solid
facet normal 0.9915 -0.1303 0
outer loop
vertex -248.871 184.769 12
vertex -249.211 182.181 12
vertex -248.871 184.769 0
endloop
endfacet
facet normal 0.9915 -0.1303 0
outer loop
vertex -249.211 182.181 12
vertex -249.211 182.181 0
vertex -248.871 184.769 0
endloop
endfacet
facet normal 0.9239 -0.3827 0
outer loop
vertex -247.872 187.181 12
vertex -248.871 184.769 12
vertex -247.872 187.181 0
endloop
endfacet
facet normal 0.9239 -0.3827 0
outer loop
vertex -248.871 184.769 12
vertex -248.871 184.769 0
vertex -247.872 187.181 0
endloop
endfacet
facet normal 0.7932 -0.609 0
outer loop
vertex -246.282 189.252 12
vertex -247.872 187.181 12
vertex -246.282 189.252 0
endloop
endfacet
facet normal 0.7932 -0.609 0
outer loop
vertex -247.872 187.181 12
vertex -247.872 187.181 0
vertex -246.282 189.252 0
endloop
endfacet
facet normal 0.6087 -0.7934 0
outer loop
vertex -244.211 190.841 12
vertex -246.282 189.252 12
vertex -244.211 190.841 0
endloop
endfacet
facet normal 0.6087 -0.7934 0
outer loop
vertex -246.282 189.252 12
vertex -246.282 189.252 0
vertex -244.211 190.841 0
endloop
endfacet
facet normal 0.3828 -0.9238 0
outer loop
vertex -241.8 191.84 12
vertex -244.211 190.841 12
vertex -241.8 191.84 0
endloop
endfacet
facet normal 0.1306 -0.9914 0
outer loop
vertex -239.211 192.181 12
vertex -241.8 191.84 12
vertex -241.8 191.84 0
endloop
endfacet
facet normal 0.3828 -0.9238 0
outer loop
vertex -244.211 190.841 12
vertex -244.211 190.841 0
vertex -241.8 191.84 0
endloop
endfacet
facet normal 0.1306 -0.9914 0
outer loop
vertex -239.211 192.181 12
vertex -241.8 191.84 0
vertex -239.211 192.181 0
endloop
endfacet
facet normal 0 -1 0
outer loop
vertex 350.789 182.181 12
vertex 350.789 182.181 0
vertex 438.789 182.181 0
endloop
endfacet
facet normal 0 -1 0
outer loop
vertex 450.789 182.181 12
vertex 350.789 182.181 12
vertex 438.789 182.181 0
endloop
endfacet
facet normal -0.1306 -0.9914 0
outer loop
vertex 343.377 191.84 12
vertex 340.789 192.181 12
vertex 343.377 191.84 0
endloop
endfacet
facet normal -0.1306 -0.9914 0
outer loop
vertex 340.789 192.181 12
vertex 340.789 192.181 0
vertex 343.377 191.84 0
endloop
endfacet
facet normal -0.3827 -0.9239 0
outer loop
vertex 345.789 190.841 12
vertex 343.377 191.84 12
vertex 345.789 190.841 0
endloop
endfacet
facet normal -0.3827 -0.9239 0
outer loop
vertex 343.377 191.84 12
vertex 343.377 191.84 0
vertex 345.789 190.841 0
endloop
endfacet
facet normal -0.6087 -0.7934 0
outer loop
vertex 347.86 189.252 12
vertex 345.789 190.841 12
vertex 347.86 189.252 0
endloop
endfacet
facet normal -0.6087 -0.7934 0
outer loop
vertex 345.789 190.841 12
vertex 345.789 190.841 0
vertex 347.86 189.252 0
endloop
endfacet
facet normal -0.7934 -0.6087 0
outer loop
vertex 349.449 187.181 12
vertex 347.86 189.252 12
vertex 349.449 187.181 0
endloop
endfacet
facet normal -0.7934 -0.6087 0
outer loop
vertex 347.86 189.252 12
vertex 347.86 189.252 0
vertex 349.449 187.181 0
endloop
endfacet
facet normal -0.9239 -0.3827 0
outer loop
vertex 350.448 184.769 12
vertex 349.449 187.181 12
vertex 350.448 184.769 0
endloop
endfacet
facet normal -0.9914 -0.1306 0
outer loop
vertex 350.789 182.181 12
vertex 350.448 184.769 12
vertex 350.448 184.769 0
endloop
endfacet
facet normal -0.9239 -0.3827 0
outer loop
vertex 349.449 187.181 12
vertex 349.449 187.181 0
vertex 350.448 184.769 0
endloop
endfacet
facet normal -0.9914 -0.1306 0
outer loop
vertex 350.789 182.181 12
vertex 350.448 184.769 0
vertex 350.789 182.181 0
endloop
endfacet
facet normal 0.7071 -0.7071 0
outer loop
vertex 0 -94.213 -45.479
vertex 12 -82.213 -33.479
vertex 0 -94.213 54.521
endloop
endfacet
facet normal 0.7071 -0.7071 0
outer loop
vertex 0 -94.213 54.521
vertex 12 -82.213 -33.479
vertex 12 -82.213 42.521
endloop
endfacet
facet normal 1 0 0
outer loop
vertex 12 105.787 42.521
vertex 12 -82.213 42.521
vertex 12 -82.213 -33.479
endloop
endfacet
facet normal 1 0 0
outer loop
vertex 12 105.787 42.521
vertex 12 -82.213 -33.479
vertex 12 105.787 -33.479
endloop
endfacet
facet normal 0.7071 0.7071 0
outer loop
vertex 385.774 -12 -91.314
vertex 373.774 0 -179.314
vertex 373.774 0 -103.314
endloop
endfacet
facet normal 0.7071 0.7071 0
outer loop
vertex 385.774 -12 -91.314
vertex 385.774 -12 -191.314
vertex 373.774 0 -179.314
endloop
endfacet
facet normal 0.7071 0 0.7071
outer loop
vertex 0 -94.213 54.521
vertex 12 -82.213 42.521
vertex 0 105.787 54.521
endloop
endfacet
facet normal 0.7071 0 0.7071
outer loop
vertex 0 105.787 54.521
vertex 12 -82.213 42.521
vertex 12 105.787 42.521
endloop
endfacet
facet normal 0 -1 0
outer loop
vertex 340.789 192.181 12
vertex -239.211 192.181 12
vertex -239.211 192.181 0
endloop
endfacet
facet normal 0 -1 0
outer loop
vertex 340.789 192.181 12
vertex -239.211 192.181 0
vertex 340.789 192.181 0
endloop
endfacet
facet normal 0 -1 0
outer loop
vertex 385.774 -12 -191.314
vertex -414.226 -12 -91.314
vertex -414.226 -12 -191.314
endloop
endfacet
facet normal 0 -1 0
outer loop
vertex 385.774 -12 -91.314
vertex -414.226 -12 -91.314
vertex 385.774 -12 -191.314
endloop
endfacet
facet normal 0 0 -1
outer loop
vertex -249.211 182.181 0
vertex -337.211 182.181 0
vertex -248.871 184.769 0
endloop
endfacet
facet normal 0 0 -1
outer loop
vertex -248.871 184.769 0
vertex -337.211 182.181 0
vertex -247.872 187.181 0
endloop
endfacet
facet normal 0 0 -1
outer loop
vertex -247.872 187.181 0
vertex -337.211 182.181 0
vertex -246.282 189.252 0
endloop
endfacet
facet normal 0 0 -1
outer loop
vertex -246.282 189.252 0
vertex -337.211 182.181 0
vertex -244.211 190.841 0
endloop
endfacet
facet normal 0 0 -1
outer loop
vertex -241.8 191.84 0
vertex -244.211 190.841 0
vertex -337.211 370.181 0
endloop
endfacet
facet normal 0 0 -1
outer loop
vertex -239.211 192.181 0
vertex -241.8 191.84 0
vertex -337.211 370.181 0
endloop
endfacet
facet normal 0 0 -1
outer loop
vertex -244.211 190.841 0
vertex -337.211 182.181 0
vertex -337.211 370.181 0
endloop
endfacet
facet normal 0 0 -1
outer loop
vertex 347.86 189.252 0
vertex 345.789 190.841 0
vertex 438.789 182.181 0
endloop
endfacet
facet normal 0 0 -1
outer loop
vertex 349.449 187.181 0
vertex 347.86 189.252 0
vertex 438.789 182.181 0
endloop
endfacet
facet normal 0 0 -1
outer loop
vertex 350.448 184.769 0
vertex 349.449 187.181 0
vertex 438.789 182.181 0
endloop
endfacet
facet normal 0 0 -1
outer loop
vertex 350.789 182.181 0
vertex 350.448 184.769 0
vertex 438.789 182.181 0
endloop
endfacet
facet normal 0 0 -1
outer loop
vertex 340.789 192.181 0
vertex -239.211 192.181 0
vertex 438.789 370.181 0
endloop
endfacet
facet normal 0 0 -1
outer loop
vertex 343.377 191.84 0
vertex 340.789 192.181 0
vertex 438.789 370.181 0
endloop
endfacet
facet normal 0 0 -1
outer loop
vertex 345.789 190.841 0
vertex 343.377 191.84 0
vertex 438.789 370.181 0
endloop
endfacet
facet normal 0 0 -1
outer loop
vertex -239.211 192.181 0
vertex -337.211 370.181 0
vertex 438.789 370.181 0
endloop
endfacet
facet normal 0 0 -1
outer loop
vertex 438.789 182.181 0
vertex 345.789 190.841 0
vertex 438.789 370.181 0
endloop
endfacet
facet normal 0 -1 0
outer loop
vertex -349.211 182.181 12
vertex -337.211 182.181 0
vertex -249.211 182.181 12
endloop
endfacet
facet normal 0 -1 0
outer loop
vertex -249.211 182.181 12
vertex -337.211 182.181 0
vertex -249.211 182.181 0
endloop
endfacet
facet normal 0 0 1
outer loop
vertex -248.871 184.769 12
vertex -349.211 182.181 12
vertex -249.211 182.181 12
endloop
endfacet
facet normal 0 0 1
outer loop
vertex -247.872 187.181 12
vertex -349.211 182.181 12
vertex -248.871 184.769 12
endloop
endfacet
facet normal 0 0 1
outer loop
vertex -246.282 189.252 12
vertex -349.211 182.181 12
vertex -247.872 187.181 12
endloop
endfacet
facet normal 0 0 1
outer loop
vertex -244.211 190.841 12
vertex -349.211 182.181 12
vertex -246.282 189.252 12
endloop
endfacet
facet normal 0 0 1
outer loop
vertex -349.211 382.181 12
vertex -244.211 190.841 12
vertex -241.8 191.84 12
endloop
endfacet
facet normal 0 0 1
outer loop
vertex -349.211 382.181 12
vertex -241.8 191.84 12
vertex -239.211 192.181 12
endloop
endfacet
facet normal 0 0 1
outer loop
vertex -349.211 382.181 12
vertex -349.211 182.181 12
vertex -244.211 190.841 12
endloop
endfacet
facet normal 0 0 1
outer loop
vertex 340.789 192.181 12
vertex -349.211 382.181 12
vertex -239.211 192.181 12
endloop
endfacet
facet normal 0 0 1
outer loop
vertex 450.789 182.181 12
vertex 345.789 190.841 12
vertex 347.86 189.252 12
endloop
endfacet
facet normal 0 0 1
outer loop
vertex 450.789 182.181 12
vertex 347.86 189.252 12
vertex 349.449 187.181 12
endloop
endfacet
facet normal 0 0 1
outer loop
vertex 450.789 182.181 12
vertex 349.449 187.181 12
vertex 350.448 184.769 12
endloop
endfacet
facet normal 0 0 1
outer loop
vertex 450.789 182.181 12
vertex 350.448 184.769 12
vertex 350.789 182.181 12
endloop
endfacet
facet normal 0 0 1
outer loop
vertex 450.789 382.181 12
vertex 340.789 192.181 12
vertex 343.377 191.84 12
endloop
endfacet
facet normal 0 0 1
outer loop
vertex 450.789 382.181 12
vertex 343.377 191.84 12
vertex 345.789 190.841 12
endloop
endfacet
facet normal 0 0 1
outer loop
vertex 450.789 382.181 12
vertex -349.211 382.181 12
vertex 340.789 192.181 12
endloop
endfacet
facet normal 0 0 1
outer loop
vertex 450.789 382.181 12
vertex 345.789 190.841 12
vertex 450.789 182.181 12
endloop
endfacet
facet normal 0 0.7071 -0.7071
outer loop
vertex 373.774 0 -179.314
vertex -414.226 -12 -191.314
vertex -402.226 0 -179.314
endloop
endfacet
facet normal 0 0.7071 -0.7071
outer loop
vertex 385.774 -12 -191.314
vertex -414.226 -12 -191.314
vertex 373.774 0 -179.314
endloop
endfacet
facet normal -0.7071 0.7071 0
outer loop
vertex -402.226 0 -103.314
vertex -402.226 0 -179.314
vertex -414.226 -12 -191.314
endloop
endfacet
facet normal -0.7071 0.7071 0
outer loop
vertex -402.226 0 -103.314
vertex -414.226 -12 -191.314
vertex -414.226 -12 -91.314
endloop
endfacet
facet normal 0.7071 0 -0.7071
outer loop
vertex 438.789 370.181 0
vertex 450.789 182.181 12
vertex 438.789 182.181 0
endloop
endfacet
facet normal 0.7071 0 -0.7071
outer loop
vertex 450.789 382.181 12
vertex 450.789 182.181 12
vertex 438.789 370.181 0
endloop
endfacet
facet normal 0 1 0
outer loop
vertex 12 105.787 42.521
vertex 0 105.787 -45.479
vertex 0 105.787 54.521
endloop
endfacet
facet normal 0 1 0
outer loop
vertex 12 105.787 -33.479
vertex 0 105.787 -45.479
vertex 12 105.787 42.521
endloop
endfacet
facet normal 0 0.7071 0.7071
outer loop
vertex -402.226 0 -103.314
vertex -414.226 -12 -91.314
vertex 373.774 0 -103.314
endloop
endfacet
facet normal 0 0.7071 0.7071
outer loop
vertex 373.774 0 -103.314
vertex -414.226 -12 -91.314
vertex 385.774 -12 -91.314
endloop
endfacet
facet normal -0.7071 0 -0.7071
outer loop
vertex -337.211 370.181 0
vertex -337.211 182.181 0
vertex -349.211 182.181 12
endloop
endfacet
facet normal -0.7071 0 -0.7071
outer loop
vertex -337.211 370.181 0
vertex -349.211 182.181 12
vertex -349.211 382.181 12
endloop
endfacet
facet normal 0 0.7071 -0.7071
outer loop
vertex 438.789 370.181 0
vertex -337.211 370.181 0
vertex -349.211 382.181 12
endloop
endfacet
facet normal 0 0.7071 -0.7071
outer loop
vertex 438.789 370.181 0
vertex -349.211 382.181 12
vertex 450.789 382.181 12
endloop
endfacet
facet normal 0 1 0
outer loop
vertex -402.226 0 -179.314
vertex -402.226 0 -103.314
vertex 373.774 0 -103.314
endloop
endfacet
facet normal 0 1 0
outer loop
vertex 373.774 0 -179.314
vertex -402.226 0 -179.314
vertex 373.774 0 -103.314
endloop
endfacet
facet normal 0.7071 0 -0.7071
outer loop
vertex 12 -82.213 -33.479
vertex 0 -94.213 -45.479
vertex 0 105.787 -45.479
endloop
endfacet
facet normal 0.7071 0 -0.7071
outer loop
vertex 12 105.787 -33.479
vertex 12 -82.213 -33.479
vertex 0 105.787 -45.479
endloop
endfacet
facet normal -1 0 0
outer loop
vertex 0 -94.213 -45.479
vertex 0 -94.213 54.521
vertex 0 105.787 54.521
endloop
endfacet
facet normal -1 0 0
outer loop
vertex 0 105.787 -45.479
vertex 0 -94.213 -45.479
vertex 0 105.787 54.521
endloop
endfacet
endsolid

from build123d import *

# Parameters (mm, degrees)
F0_W      = 800
F0_H      = 100
F1_DEPTH  = 12
F2_W      = 200
F2_H      = 100
F3_DEPTH  = 12
F4_SIZE   = 11.99999
F5_SIZE   = 11.99999
F6_SIZE   = 11.99999
F7_W      = 800
F7_H      = 200
F8_DEPTH  = 12
F9_SIZE   = 11.99999
F10_SIZE  = 11.99999
F11_SIZE  = 11.99999
F12_SIZE  = 11.99999
F13_SIZE  = 11.99999
F14_SIZE  = 11.99999
F15_SIZE  = 11.99999
F16_W     = 600
F16_H     = 20
F17_DEPTH = 25
F18_R     = 9.99999
F19_R     = 9.99999


# Not quite as in the source:
# - a fillet or chamfer is up to 0.001 mm smaller than in the source, because OpenCascade refuses the exact size


with BuildPart() as f1:
    # F0 (on Front) → F1 (new body)
    with BuildSketch(Plane.XZ):
        with Locations((-14.225743711, -141.3142682277)):
            Rectangle(F0_W, F0_H)
    extrude(amount=F1_DEPTH)

    # F5 (size 12 in the source; OpenCascade refuses exactly that, so slightly less here)
    f5_edges = [f1.edges().sort_by_distance(p)[0] for p in [
        (-414.225744, 0, -141.314268),
    ]]
    chamfer(f5_edges, length=F5_SIZE)

    # F6 (size 12 in the source; OpenCascade refuses exactly that, so slightly less here)
    f6_edges = [f1.edges().sort_by_distance(p)[0] for p in [
        (385.774256, 0, -141.314268),
    ]]
    chamfer(f6_edges, length=F6_SIZE)

    # F9 (size 12 in the source; OpenCascade refuses exactly that, so slightly less here)
    f9_edges = [f1.edges().sort_by_distance(p)[0] for p in [
        (-14.225744, 0, -91.314268),
    ]]
    chamfer(f9_edges, length=F9_SIZE)

    # F10 (size 12 in the source; OpenCascade refuses exactly that, so slightly less here)
    f10_edges = [f1.edges().sort_by_distance(p)[0] for p in [
        (-14.225744, 0, -191.314268),
    ]]
    chamfer(f10_edges, length=F10_SIZE)


with BuildPart() as f3:
    # F2 (on Right) → F3 (new body)
    with BuildSketch(Plane.YZ):
        with Locations((5.7870447636, 4.5209136379)):
            Rectangle(F2_W, F2_H)
    extrude(amount=F3_DEPTH)

    # F4 (size 12 in the source; OpenCascade refuses exactly that, so slightly less here)
    f4_edges = [f3.edges().sort_by_distance(p)[0] for p in [
        (12, -94.212955, 4.520914),
    ]]
    chamfer(f4_edges, length=F4_SIZE)

    # F14 (size 12 in the source; OpenCascade refuses exactly that, so slightly less here)
    f14_edges = [f3.edges().sort_by_distance(p)[0] for p in [
        (12, 11.78704, 54.520914),
    ]]
    chamfer(f14_edges, length=F14_SIZE)

    # F15 (size 12 in the source; OpenCascade refuses exactly that, so slightly less here)
    f15_edges = [f3.edges().sort_by_distance(p)[0] for p in [
        (12, 11.78704, -45.479086),
    ]]
    chamfer(f15_edges, length=F15_SIZE)


with BuildPart() as f8:
    # F7 (on Top) → F8 (new body)
    with BuildSketch(Plane.XY):
        with Locations((50.7886199192, 282.1810945868)):
            Rectangle(F7_W, F7_H)
    extrude(amount=F8_DEPTH)

    # F11 (size 12 in the source; OpenCascade refuses exactly that, so slightly less here)
    f11_edges = [f8.edges().sort_by_distance(p)[0] for p in [
        (50.78862, 382.181095, 0),
    ]]
    chamfer(f11_edges, length=F11_SIZE)

    # F12 (size 12 in the source; OpenCascade refuses exactly that, so slightly less here)
    f12_edges = [f8.edges().sort_by_distance(p)[0] for p in [
        (-349.21138, 276.1811, 0),
    ]]
    chamfer(f12_edges, length=F12_SIZE)

    # F13 (size 12 in the source; OpenCascade refuses exactly that, so slightly less here)
    f13_edges = [f8.edges().sort_by_distance(p)[0] for p in [
        (450.78862, 276.1811, 0),
    ]]
    chamfer(f13_edges, length=F13_SIZE)

    # F16 (on face) → F17 (cut)
    with BuildSketch(Plane.XY.offset(12)):
        with Locations((50.7886199192, 182.1810945868)):
            Rectangle(F16_W, F16_H)
    extrude(amount=-F17_DEPTH, mode=Mode.SUBTRACT)

    # F18 (radius 10 in the source; OpenCascade refuses exactly that, so slightly less here)
    f18_edges = [f8.edges().sort_by_distance(p)[0] for p in [
        (-249.21138, 192.181095, 6),
    ]]
    fillet(f18_edges, radius=F18_R)

    # F19 (radius 10 in the source; OpenCascade refuses exactly that, so slightly less here)
    f19_edges = [f8.edges().sort_by_distance(p)[0] for p in [
        (350.78862, 192.181095, 6),
    ]]
    fillet(f19_edges, radius=F19_R)


solid = Compound([f1.part, f3.part, f8.part])
